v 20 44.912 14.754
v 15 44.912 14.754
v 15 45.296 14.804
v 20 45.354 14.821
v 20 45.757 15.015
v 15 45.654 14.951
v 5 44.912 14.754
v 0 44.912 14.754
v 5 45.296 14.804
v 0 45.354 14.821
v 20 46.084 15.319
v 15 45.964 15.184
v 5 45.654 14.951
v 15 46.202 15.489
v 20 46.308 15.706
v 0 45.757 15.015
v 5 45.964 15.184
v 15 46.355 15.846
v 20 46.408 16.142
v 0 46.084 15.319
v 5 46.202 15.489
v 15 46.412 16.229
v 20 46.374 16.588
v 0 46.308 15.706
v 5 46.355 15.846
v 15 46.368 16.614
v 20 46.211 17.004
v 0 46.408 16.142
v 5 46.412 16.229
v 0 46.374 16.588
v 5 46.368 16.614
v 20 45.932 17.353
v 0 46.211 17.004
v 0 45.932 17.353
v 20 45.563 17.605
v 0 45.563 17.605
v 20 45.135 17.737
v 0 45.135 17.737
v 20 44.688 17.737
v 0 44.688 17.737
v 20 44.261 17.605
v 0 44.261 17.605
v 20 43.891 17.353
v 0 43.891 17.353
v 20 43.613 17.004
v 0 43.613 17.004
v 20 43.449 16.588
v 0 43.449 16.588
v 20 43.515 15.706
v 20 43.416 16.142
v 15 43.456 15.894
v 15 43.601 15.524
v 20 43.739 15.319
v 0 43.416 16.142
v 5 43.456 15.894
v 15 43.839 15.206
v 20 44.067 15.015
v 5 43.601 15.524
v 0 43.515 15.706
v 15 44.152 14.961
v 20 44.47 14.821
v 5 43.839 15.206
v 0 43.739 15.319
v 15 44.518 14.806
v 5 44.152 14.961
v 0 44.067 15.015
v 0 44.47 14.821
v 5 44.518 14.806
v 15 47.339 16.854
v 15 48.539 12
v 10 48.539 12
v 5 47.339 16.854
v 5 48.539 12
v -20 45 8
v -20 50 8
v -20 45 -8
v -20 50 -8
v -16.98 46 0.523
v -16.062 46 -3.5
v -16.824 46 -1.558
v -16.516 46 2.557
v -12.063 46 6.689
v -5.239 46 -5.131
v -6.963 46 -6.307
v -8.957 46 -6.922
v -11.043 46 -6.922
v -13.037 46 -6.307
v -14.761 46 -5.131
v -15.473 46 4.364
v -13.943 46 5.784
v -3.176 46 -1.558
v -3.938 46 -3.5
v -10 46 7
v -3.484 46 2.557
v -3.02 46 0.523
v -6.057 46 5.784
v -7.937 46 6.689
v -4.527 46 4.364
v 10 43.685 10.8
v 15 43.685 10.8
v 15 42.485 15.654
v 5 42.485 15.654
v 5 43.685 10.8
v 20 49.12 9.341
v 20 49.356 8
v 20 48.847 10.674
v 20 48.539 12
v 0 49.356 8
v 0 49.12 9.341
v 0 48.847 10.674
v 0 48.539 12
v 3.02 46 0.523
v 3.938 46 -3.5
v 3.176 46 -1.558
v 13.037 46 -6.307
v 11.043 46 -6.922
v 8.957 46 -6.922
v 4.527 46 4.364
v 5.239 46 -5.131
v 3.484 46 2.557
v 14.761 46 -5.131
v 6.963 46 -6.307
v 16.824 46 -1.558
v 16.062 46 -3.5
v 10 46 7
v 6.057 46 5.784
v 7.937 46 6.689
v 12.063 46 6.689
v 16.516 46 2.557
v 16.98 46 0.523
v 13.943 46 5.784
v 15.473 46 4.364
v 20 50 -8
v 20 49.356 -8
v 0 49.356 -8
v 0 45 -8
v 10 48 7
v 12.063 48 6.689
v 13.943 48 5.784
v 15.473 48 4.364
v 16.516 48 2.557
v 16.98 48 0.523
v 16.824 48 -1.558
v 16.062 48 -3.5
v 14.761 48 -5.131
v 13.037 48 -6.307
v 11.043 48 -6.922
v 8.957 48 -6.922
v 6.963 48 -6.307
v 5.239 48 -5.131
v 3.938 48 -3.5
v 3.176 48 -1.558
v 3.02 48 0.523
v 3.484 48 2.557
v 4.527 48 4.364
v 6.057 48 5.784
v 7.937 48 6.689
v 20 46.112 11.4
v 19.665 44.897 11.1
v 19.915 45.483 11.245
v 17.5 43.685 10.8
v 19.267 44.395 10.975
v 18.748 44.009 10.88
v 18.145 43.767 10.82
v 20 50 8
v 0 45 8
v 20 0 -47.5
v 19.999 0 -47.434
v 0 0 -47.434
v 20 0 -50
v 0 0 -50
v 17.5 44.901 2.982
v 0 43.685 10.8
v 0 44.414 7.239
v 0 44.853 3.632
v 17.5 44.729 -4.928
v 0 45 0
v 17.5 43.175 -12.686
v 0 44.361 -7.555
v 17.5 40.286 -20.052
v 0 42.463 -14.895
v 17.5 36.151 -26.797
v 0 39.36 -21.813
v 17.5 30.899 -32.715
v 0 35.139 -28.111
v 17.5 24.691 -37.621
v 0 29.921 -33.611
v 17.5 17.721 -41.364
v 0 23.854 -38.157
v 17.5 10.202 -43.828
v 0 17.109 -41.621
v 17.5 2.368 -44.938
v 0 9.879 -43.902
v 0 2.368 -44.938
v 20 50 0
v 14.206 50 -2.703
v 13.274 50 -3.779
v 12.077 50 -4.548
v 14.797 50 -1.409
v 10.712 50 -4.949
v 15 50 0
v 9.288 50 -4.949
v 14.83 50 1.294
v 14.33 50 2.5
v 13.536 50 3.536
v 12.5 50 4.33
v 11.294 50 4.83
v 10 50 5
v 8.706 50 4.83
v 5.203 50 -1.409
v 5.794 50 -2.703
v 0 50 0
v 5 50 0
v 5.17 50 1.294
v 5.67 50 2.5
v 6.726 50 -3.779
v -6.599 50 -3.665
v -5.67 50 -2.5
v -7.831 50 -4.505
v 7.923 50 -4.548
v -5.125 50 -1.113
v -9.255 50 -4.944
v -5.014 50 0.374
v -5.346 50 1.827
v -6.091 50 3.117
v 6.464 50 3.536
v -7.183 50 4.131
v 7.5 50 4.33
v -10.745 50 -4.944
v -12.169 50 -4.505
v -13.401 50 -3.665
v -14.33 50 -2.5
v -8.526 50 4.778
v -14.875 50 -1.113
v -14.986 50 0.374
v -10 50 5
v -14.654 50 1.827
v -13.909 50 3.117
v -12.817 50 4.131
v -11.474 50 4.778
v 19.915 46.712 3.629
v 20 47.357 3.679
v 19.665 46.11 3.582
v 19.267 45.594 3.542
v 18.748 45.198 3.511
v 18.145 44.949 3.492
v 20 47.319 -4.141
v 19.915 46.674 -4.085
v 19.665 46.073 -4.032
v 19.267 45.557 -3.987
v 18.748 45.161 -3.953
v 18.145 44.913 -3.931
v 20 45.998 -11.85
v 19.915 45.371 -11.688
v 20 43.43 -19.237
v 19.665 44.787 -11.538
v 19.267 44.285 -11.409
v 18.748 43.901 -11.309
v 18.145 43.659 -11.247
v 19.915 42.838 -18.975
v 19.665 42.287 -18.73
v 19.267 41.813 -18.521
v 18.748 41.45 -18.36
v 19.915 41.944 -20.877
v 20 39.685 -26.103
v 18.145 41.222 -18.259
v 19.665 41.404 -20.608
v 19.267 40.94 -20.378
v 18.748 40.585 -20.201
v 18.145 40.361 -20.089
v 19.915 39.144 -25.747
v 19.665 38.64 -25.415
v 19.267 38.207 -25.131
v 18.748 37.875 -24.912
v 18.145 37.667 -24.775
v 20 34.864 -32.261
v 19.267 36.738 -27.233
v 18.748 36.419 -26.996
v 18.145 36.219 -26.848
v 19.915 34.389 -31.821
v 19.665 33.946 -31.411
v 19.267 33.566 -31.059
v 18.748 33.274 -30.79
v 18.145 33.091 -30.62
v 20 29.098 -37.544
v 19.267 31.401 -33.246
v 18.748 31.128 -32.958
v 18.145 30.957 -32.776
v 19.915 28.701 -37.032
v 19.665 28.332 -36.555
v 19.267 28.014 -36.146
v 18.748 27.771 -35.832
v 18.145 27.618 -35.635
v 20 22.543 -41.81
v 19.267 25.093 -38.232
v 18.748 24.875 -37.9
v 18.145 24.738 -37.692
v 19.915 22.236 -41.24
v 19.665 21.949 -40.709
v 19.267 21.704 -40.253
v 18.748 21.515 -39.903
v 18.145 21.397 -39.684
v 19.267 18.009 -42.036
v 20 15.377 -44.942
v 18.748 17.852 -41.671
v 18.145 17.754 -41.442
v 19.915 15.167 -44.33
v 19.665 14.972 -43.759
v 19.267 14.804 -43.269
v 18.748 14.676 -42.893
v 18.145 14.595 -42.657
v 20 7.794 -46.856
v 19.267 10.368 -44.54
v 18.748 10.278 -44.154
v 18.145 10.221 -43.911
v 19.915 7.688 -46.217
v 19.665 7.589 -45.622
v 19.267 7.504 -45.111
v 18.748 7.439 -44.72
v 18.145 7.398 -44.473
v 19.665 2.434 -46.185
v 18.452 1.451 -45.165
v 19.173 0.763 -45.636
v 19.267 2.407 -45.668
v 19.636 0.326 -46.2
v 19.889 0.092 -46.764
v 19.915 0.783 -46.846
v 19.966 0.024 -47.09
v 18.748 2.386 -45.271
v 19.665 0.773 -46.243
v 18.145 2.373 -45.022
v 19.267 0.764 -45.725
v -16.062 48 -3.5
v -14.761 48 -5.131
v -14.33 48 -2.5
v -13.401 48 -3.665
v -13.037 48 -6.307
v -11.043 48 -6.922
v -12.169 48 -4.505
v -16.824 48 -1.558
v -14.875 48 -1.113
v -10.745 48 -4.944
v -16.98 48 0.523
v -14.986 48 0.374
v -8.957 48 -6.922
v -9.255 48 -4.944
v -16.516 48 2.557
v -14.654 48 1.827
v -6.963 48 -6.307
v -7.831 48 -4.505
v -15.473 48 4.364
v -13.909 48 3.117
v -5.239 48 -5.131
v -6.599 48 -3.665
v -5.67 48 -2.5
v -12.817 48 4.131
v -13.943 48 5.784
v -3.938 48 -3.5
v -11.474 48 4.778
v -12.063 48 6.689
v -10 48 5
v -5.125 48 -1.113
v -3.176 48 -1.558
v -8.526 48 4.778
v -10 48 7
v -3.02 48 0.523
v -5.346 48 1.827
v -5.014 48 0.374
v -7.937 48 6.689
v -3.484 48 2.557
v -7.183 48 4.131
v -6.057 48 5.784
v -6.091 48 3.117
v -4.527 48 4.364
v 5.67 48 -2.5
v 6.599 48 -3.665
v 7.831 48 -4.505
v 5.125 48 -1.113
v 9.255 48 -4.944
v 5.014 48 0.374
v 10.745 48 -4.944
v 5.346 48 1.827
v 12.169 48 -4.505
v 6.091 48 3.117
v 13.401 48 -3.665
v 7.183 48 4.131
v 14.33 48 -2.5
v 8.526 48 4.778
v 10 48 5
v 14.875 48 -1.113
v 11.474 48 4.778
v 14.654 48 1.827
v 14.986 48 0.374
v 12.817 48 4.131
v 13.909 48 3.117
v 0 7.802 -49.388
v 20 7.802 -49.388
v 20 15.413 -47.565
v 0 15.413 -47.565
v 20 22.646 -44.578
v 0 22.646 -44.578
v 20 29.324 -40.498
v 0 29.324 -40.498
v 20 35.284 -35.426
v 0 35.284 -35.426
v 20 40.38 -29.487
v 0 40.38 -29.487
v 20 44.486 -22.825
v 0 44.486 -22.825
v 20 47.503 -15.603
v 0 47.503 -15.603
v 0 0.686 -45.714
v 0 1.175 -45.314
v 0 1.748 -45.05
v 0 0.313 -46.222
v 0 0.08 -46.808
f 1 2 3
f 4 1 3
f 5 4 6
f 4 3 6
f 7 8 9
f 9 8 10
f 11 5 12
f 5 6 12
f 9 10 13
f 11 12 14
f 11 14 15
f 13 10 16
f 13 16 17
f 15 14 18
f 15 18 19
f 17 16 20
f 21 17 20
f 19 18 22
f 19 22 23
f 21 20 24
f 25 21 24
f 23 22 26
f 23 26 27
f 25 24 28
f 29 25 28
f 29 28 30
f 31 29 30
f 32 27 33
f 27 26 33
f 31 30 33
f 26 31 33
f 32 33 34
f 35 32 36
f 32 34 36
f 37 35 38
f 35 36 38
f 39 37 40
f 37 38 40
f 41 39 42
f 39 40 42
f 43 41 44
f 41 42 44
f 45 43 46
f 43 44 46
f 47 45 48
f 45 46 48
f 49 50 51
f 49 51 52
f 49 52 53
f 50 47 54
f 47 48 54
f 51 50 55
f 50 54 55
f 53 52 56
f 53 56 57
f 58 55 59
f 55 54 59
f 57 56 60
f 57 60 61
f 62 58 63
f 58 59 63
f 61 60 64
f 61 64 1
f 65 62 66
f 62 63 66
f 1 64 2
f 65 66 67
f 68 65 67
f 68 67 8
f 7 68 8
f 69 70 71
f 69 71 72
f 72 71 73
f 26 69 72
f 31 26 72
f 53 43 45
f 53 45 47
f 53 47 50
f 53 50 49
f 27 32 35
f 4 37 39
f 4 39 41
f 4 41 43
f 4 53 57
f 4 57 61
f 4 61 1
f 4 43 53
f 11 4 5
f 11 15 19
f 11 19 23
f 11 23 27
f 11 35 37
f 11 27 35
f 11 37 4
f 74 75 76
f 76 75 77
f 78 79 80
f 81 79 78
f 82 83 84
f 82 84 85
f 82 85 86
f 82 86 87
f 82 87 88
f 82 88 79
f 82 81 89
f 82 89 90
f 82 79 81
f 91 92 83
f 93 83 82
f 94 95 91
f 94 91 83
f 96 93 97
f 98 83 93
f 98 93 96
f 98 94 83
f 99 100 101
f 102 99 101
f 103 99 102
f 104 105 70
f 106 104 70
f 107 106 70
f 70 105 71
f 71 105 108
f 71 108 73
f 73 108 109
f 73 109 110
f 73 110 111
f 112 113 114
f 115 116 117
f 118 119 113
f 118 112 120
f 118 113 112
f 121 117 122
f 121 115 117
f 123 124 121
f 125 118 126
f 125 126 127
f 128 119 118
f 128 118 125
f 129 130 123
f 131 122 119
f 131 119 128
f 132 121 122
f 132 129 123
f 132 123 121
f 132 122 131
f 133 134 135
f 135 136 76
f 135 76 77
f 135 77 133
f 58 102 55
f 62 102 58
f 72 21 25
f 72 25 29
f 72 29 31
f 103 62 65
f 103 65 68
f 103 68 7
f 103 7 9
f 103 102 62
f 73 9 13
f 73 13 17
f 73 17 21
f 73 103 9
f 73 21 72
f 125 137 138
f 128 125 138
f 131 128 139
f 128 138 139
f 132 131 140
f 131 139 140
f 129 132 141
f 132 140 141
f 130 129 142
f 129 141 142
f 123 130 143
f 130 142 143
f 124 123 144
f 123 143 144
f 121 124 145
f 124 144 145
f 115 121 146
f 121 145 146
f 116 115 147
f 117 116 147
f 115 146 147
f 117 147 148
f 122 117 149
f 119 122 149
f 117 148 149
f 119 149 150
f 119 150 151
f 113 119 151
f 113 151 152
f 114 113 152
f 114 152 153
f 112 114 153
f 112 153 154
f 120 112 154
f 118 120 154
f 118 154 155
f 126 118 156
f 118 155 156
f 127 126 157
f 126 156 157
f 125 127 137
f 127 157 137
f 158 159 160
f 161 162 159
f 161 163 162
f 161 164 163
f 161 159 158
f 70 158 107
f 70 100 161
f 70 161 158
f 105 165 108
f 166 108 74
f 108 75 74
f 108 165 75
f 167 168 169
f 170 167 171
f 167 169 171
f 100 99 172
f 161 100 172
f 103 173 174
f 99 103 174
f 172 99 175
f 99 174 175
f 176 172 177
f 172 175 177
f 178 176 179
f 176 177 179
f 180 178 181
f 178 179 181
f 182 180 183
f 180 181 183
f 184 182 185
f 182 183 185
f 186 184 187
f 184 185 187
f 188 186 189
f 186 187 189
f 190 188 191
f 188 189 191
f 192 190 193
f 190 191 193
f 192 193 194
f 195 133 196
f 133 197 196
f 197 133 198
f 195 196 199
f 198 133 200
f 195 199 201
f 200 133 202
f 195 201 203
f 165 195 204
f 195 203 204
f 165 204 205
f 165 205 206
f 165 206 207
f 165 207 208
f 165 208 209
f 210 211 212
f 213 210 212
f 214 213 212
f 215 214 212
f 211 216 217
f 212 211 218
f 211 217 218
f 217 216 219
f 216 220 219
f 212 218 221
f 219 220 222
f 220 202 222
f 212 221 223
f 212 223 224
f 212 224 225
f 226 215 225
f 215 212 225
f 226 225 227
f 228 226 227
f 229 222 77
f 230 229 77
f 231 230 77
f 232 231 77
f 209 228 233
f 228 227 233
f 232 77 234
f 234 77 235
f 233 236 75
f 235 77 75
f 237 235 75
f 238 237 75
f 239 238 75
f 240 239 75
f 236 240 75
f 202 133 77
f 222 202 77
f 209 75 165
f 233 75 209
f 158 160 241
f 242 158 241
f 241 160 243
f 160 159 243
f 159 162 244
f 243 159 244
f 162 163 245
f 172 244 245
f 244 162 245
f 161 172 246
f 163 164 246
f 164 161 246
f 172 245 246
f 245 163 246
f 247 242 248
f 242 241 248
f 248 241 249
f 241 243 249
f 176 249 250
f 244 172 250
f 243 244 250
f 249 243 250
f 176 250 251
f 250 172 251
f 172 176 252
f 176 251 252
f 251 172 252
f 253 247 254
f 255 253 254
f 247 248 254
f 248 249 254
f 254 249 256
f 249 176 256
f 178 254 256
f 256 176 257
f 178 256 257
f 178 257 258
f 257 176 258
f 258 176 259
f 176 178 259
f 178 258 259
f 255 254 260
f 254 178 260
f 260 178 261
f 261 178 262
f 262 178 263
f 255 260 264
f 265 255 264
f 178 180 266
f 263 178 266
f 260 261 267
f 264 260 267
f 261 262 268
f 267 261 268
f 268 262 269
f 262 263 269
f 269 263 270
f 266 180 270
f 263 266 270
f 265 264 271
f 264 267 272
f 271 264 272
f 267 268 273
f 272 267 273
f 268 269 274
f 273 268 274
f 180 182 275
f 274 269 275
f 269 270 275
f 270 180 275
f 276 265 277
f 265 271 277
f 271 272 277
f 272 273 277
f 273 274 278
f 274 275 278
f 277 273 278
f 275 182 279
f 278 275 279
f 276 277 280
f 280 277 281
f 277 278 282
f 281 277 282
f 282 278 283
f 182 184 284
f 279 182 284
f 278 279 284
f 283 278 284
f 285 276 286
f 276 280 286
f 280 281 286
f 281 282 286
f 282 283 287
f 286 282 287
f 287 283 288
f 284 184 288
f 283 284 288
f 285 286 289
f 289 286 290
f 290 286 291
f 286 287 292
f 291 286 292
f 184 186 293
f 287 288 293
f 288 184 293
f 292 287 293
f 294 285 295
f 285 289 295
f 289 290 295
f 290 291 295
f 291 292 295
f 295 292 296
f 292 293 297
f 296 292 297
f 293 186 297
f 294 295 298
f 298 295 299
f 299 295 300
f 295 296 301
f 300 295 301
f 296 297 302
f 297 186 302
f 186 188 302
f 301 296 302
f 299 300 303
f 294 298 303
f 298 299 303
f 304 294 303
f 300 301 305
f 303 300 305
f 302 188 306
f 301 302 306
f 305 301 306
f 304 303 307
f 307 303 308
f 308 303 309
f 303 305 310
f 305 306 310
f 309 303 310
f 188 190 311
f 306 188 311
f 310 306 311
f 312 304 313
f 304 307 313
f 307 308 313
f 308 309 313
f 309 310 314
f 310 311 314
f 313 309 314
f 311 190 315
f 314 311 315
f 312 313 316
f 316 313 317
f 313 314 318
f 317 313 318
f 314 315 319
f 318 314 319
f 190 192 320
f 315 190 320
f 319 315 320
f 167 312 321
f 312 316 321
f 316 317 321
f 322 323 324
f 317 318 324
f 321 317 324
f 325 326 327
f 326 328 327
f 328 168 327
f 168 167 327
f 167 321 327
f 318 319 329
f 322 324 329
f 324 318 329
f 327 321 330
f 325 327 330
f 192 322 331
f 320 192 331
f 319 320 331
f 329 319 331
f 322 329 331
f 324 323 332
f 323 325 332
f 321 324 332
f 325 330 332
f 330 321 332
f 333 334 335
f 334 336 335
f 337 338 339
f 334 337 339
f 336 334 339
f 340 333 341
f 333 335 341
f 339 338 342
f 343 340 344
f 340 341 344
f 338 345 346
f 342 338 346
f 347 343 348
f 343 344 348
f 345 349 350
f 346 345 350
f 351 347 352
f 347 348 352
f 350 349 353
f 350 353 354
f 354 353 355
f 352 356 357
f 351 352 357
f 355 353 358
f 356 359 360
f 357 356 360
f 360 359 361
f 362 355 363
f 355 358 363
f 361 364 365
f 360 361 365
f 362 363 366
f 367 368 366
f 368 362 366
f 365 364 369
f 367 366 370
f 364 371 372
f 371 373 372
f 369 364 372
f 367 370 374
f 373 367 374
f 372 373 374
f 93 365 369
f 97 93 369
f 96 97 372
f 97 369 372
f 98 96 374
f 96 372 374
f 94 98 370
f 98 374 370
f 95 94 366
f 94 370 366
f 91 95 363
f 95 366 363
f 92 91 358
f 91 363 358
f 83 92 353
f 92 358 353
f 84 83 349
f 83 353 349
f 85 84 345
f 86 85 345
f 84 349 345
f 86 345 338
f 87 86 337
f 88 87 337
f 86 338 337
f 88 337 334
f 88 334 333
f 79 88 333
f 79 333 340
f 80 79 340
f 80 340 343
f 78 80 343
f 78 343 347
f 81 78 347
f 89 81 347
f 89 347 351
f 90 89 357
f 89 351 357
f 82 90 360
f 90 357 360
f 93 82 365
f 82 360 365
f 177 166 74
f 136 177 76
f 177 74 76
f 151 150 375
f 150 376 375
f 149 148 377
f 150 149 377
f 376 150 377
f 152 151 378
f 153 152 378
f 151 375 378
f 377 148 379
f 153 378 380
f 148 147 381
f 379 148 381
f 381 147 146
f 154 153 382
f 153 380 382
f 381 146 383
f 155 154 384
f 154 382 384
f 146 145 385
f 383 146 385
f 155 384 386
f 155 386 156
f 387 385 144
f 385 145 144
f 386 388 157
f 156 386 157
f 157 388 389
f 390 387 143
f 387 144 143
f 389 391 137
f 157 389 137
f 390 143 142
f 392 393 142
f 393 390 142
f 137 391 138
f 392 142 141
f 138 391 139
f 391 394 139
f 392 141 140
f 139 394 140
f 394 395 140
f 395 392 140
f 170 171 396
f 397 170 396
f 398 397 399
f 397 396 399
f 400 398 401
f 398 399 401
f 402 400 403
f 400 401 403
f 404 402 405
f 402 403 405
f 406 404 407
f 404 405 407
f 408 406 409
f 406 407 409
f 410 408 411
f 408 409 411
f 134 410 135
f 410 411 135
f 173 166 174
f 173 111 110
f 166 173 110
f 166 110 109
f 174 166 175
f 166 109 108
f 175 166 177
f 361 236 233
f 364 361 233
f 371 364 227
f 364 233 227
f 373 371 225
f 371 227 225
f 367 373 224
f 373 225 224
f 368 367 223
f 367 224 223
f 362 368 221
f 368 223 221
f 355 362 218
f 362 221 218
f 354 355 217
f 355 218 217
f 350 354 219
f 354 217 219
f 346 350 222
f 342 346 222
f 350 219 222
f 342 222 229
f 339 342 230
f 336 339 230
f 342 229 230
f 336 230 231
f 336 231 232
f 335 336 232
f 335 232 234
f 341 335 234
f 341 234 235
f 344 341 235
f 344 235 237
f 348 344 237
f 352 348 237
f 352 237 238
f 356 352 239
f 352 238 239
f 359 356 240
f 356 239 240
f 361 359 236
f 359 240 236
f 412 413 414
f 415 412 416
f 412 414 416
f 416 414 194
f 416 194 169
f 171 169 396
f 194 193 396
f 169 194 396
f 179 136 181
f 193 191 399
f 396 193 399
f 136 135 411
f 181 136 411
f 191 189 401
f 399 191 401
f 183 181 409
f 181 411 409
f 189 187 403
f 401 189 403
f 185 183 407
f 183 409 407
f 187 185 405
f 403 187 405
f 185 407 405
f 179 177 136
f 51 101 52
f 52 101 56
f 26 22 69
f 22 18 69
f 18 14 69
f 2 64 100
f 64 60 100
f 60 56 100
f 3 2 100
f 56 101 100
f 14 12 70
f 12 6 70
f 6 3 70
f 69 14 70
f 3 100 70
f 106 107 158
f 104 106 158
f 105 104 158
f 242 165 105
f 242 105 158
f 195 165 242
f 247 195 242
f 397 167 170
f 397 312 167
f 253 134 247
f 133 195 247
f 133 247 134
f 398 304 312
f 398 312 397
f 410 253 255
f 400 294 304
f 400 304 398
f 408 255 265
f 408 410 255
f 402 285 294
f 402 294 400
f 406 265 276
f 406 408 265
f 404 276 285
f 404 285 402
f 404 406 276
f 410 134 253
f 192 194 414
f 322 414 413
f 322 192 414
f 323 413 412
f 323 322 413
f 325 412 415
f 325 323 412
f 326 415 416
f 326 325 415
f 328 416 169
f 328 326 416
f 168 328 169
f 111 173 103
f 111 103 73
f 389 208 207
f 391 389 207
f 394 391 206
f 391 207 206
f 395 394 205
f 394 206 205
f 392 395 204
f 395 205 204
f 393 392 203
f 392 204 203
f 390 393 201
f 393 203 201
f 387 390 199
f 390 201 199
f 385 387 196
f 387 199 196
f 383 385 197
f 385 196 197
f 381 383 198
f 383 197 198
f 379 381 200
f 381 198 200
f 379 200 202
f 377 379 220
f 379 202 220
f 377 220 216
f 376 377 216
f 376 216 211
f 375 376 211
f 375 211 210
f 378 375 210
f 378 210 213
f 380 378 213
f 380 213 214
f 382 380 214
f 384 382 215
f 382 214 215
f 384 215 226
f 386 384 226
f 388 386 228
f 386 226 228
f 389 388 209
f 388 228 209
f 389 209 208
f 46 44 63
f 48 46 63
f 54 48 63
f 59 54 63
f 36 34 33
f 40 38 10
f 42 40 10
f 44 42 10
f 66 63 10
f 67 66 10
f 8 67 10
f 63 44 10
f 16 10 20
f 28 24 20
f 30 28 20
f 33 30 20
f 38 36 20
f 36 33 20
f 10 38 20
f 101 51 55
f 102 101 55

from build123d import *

# Parameters (mm, degrees)
BOSS_EXTRUDE1_DEPTH      = 20
BOSS_EXTRUDE2_DEPTH      = 20
BOSS_EXTRUDE2_DEPTH_BACK = 20
SKETCH4_R                = 5
CUT_EXTRUDE1_DEPTH       = 2
SKETCH5_R                = 7
CUT_EXTRUDE2_DEPTH       = 2
SKETCH16_W               = 20
SKETCH16_H               = 5
SKETCH17_W               = 5
SKETCH17_H               = 5
BOSS_EXTRUDE10_DEPTH     = 5
SKETCH18_R               = 1.5
BOSS_EXTRUDE11_DEPTH     = 10
SKETCH19_R               = 5
CUT_EXTRUDE3_DEPTH       = 2
SKETCH20_R               = 7
CUT_EXTRUDE4_DEPTH       = 2
FILLET2_R                = 2.5


with BuildPart() as part:
    # Sketch2 → Boss-Extrude1 (new body)
    with BuildSketch(Plane(origin=(0, 0, 0), x_dir=(0, 0, -1), z_dir=(1, 0, 0))):
        with BuildLine():
            Line((-50, 0), (-45, 0))
            ThreePointArc((-45, 0), (0, 45), (45, 0))
            Line((45, 0), (50, 0))
            ThreePointArc((50, 0), (0, 50), (-50, 0))
        make_face()
    extrude(amount=BOSS_EXTRUDE1_DEPTH)

    # Sketch3 → Boss-Extrude2 (add, two sides: drawn at the far end of the back side and taken through both)
    with BuildSketch(Plane(origin=(0, 0, 0), x_dir=(0, 0, -1), z_dir=(1, 0, 0)).offset(-BOSS_EXTRUDE2_DEPTH_BACK)):
        Polygon((0, 45), (8, 45), (8, 50), (-8, 50), (-8, 45), align=None)
    extrude(amount=BOSS_EXTRUDE2_DEPTH + BOSS_EXTRUDE2_DEPTH_BACK)

    # Sketch4 → Cut-Extrude1 (cut)
    with BuildSketch(Plane(origin=(0, 50, 0), x_dir=(1, 0, 0), z_dir=(0, 1, 0))):
        with Locations((10, 0)):
            Circle(SKETCH4_R)
    extrude(amount=-CUT_EXTRUDE1_DEPTH, mode=Mode.SUBTRACT)

    # Sketch5 → Cut-Extrude2 (cut)
    with BuildSketch(Plane(origin=(0, 48, 0), x_dir=(1, 0, 0), z_dir=(0, 1, 0))):
        with Locations((10, 0)):
            Circle(SKETCH5_R)
    extrude(amount=-CUT_EXTRUDE2_DEPTH, mode=Mode.SUBTRACT)

    # Cut-Sweep1: sweep along a path in Sketch15
    with BuildLine(Plane.ZY) as cut_sweep1_path:
        ThreePointArc((50, 0), (39.37003937, 30.822070015), (12, 48.538644398))
    # Sketch16 → Cut-Sweep1 (sweep, cut)
    with BuildSketch(Plane.XZ):
        with Locations((10, 47.5)):
            Rectangle(SKETCH16_W, SKETCH16_H)
    sweep(path=cut_sweep1_path.line, mode=Mode.SUBTRACT)

    # Sketch17 → Boss-Extrude10 (add)
    with BuildSketch(Plane(origin=(0, 0, 0), x_dir=(1, 0, 0), z_dir=(0, -0.24000000000000005, 0.9707728879609278))):
        with Locations((7.5, 47.5)):
            Rectangle(SKETCH17_W, SKETCH17_H)
    boss_extrude10 = extrude(amount=BOSS_EXTRUDE10_DEPTH)

    # Sketch18 → Boss-Extrude11 (add)
    with BuildSketch(Plane(origin=(10, 0, 0), x_dir=(0, 0, -1), z_dir=(1, 0, 0))):
        with Locations((-16.25386444, 44.911712178)):
            Circle(SKETCH18_R)
    boss_extrude11 = extrude(amount=-BOSS_EXTRUDE11_DEPTH)

    # Mirror1: Boss-Extrude10, Boss-Extrude11 across plane
    add(boss_extrude10.mirror(Plane(origin=(10, 42.484779958, 15.65386444), x_dir=(0, 0, 1), z_dir=(-1, 0, 0))))
    add(boss_extrude11.mirror(Plane(origin=(10, 42.484779958, 15.65386444), x_dir=(0, 0, 1), z_dir=(-1, 0, 0))))

    # Sketch19 → Cut-Extrude3 (cut)
    with BuildSketch(Plane(origin=(0, 50, 0), x_dir=(1, 0, 0), z_dir=(0, 1, 0))):
        with Locations((-10, 0)):
            Circle(SKETCH19_R)
    extrude(amount=-CUT_EXTRUDE3_DEPTH, mode=Mode.SUBTRACT)

    # Sketch20 → Cut-Extrude4 (cut)
    with BuildSketch(Plane(origin=(0, 48, 0), x_dir=(1, 0, 0), z_dir=(0, 1, 0))):
        with Locations((-10, 0)):
            Circle(SKETCH20_R)
    extrude(amount=-CUT_EXTRUDE4_DEPTH, mode=Mode.SUBTRACT)

    # Fillet2
    fillet2_edges = [part.edges().sort_by_distance(p)[0] for p in [
        (20, 35.433035433, -27.739863013),
        (10, 0, -45),
    ]]
    fillet(fillet2_edges, radius=FILLET2_R)


solid = part.part
